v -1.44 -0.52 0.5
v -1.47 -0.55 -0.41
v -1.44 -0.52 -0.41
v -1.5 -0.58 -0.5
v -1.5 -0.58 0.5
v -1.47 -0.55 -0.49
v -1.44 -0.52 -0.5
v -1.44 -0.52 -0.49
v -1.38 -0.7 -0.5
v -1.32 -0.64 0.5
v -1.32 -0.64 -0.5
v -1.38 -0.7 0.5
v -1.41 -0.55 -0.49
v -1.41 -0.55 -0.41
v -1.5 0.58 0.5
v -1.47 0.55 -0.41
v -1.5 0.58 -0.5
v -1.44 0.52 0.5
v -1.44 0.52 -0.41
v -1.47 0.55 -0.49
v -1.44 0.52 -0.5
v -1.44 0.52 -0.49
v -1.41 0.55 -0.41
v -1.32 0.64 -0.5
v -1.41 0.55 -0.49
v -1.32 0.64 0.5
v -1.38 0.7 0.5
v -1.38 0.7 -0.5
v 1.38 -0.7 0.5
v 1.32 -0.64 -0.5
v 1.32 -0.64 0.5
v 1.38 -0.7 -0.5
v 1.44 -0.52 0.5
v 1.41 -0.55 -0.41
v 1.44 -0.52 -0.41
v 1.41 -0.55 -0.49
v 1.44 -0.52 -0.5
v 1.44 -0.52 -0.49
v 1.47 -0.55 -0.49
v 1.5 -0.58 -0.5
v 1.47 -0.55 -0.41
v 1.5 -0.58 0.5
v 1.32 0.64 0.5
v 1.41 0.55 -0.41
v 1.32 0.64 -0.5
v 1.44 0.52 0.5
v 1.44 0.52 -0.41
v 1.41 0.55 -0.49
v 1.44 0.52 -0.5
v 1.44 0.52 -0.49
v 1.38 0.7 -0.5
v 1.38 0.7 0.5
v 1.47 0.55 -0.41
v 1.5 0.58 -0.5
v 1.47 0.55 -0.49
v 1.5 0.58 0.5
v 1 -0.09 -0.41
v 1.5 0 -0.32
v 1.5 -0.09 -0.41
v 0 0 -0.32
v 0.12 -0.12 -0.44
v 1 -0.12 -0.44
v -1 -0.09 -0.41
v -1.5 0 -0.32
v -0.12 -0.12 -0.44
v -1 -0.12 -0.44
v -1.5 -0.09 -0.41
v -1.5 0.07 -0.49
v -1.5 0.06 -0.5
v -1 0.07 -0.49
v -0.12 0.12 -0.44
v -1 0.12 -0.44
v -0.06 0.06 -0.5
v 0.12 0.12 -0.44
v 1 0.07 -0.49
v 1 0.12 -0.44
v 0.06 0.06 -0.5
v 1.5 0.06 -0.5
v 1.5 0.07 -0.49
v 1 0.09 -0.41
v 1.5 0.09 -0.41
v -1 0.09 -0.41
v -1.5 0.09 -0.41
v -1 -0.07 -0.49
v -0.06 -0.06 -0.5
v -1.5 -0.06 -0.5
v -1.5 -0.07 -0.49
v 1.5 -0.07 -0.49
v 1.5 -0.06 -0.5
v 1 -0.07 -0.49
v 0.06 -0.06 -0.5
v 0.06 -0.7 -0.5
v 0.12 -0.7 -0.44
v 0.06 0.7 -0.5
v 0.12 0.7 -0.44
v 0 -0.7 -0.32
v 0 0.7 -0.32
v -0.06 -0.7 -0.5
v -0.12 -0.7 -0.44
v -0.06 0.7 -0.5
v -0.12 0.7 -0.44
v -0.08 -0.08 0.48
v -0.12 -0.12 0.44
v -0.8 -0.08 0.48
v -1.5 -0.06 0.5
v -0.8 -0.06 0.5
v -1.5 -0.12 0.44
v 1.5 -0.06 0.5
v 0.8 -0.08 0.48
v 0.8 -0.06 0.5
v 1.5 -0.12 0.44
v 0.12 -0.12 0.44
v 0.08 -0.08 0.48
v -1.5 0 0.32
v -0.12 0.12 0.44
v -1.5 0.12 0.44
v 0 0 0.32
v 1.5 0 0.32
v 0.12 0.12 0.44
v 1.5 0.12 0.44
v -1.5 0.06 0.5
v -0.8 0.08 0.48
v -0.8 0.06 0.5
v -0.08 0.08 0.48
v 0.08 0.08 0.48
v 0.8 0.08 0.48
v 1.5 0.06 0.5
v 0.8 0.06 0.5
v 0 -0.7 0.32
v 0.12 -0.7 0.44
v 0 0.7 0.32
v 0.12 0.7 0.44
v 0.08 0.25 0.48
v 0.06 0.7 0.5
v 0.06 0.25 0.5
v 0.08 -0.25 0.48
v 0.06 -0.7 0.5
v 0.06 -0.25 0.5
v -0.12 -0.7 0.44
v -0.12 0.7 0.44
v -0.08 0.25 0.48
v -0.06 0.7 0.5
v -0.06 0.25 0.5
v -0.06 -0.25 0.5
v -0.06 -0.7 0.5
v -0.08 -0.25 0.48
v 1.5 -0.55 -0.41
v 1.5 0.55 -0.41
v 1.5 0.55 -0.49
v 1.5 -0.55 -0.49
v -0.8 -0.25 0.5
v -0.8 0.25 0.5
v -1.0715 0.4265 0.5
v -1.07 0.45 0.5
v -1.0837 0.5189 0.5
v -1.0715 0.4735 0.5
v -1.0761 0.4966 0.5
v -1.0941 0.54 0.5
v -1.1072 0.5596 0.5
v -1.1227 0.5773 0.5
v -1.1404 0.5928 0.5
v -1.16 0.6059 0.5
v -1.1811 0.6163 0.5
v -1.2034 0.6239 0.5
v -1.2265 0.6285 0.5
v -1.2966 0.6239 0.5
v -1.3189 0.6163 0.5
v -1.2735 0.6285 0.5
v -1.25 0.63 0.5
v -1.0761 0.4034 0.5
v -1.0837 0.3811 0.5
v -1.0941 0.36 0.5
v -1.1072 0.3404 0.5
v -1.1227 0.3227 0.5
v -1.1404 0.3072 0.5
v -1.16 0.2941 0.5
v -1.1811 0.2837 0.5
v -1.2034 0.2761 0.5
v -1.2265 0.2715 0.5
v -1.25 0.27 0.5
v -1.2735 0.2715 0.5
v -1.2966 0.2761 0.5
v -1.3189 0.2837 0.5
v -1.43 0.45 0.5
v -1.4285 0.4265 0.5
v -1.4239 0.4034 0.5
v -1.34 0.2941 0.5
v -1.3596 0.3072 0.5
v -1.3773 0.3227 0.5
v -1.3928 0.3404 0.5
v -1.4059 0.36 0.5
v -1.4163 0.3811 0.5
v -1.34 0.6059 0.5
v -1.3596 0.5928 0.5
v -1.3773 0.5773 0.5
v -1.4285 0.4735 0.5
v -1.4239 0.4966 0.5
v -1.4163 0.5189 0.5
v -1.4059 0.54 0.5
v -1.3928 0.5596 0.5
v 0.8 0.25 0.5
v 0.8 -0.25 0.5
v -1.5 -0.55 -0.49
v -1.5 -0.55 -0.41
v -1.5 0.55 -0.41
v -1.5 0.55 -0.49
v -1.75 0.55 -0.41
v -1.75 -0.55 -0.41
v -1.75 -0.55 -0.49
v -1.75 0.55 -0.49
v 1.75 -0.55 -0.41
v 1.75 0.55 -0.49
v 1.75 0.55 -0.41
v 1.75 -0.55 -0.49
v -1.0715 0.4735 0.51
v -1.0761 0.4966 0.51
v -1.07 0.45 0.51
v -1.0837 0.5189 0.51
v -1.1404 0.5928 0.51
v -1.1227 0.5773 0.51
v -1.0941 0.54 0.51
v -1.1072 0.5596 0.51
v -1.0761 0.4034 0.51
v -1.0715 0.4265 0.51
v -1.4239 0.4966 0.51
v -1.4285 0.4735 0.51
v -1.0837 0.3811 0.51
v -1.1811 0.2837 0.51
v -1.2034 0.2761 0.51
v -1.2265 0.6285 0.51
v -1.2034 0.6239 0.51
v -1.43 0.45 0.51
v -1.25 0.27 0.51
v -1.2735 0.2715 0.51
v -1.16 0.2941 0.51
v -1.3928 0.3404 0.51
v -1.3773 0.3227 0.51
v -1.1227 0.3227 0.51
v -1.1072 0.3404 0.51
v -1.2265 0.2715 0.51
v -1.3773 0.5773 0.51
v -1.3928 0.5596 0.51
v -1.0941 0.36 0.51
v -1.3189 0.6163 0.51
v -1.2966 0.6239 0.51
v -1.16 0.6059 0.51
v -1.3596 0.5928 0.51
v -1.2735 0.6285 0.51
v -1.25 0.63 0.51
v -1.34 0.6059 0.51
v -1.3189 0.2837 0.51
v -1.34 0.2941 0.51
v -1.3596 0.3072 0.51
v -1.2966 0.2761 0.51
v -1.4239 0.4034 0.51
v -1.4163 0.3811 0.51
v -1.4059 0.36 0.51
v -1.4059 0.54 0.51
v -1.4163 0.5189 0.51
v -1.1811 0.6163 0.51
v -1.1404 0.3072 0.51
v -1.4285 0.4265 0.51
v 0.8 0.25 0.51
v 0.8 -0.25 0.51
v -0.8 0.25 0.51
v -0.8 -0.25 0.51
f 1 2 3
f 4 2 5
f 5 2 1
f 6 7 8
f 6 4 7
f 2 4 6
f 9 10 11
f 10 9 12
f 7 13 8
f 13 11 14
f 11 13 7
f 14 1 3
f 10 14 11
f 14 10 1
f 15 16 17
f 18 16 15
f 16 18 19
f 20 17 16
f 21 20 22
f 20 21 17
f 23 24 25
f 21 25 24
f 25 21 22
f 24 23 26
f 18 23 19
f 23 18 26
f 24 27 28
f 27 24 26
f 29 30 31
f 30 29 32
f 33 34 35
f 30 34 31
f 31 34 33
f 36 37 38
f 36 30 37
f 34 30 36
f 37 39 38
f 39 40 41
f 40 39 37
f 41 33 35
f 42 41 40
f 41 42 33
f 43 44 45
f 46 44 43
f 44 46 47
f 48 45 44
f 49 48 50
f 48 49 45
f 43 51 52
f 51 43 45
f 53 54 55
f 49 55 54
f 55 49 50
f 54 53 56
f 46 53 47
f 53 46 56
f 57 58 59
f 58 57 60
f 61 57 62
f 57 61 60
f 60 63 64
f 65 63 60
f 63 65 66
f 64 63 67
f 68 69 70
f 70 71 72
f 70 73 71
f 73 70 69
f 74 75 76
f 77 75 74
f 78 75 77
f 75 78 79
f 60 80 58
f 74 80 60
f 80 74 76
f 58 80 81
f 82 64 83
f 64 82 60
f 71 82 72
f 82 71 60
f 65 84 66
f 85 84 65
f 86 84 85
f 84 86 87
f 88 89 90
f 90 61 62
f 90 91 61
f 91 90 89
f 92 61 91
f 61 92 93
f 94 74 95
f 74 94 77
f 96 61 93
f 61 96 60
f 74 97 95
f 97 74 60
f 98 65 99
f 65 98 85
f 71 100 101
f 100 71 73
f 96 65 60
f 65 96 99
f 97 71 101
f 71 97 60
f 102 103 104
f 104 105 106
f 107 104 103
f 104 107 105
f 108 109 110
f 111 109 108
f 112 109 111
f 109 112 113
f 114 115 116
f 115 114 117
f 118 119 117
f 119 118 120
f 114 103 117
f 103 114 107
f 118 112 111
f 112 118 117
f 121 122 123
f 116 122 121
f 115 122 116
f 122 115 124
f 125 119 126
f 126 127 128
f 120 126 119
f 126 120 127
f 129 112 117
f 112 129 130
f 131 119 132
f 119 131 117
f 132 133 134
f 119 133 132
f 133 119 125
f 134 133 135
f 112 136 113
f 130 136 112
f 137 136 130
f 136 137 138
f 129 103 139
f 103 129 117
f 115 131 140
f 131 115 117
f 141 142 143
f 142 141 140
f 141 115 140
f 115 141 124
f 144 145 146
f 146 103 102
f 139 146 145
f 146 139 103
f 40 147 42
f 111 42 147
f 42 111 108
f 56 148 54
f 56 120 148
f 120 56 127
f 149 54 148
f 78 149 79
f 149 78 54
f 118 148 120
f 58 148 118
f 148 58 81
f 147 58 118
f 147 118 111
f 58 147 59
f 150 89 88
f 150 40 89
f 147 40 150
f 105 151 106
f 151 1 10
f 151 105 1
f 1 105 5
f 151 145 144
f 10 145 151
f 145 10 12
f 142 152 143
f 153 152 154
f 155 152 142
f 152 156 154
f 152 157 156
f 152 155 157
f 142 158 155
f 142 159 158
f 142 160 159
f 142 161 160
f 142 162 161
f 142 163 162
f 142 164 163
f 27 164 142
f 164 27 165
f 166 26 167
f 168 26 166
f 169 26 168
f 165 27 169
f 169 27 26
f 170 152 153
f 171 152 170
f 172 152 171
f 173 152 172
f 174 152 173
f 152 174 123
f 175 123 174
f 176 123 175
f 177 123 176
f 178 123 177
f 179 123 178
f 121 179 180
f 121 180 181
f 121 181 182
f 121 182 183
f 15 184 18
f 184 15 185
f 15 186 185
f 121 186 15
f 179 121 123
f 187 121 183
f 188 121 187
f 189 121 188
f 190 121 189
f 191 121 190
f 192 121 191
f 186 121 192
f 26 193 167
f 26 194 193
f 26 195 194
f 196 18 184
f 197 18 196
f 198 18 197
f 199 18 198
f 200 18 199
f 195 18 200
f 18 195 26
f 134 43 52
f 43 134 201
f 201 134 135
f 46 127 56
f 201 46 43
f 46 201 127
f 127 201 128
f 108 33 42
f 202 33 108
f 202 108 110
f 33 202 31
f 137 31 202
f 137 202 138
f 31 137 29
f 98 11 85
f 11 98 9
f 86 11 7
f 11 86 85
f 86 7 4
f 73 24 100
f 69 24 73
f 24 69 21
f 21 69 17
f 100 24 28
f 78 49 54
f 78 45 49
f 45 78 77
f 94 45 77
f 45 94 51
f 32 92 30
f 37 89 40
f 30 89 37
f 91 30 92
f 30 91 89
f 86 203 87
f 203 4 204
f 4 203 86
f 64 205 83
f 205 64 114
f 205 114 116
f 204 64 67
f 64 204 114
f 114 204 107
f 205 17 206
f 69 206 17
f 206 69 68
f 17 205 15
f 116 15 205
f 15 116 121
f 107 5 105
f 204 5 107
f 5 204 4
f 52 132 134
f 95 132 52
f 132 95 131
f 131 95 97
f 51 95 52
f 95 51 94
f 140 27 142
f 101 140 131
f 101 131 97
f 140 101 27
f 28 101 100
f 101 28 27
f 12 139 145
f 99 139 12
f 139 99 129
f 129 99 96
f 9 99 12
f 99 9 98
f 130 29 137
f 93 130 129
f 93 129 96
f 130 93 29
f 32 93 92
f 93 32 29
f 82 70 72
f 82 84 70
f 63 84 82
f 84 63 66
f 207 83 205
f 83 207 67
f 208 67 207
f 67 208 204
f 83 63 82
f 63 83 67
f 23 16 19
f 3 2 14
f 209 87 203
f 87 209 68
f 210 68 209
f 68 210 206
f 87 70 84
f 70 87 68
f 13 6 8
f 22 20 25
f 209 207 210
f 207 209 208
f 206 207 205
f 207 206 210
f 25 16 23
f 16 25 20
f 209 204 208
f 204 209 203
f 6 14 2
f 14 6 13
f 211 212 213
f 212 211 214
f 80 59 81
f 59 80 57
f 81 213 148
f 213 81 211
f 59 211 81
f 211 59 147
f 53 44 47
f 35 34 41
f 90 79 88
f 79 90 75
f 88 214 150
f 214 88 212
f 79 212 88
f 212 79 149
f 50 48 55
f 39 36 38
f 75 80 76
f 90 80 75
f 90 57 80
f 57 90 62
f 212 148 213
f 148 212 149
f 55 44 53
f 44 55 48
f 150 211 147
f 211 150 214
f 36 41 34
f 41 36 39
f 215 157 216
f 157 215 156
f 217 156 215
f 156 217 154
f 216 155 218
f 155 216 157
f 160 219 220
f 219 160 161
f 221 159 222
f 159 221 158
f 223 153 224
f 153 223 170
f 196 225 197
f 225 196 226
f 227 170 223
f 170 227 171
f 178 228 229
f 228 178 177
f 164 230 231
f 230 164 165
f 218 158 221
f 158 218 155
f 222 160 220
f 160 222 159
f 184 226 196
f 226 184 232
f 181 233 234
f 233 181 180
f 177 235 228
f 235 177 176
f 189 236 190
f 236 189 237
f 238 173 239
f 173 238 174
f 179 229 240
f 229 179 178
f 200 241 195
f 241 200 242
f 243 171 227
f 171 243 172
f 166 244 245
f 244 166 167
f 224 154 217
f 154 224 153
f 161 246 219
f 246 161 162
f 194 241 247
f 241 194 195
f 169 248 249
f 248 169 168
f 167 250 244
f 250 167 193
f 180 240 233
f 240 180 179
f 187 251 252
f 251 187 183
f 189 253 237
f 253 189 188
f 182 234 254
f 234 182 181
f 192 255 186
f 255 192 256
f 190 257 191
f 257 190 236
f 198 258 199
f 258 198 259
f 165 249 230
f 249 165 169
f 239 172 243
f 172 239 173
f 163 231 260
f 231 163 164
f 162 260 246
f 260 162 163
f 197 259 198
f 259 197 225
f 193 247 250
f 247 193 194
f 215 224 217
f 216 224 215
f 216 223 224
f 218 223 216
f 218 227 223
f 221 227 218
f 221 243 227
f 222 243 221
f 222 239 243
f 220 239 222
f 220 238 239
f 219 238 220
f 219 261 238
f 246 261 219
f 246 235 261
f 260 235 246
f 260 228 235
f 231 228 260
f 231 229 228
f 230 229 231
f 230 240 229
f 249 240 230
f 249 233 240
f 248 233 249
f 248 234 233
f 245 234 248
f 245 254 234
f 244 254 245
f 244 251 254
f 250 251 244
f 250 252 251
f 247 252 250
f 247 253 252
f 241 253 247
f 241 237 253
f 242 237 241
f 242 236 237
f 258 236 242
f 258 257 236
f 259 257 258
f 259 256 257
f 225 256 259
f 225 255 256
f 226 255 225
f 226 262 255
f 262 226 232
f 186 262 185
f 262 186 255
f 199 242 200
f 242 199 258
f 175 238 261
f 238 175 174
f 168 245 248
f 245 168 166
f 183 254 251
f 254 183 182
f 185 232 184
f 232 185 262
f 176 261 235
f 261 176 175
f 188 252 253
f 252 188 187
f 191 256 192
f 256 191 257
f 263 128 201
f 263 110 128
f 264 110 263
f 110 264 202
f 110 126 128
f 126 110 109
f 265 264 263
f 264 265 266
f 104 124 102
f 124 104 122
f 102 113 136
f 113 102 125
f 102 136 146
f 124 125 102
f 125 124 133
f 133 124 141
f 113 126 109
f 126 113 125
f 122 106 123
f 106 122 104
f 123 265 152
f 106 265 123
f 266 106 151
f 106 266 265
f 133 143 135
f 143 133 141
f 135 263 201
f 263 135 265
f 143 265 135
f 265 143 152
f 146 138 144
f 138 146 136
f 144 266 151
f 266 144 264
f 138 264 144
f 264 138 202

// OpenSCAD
// SMD package: overall body [L,W,H] = [3, 1.4, 1.0] mm
// One connected solid (pads fused to body with small overlap)

$fn = 48;

// Parameters
body_L = 3.0; //[1.5:6.0:0.1]
body_W = 1.4; //[0.7:2.8:0.1]
body_H = 1.0; //[0.5:2.0:0.1]

pad_L = 0.5; //[0.25:1.0:0.05]
pad_W = 1.1; //[0.6:1.4:0.05]
pad_T = 0.08; //[0.03:0.2:0.01]
pad_overlap = 0.25; //[0.05:0.8:0.05]  // overlap into body to guarantee connectivity

mark_R = 0.18; //[0.08:0.4:0.01]
mark_inset = 0.25; //[0.1:0.6:0.05]
mark_T = 0.05; //[0.02:0.15:0.01]

top_mark_L = 1.6; //[0.8:2.8:0.1]
top_mark_W = 0.5; //[0.2:1.2:0.05]
top_mark_T = 0.03; //[0.01:0.12:0.01]

chamfer = 0.12; //[0.00:0.35:0.01]     // small, safe chamfer
eps = 0.01; //[0.001:0.1:0.001]

// Helpers
function clamp(v, lo, hi) = v < lo ? lo : (v > hi ? hi : v);
ch = clamp(chamfer, 0, min(body_L, body_W, body_H)/3);

// Base body with simple edge chamfers (robust; avoids slanted "plane" artifacts)
module body_chamfered() {
  color([0.85, 0.85, 0.8])
  difference() {
    cube([body_L, body_W, body_H], center=true);

    // Cut 4 vertical edges (along Z) using rotated cubes
    for (sx = [-1, 1], sy = [-1, 1]) {
      translate([sx*(body_L/2 - ch/2), sy*(body_W/2 - ch/2), 0])
        rotate([0, 0, 45])
          cube([ch*sqrt(2), ch*sqrt(2), body_H + 2*eps], center=true);
    }

    // Light top/bottom edge bevels (along X) to soften silhouette
    for (sz = [-1, 1]) {
      translate([0, 0, sz*(body_H/2 - ch/2)])
        rotate([45, 0, 0])
          cube([body_L + 2*eps, ch*sqrt(2), ch*sqrt(2)], center=true);

      translate([0, 0, sz*(body_H/2 - ch/2)])
        rotate([0, 45, 0])
          cube([ch*sqrt(2), body_W + 2*eps, ch*sqrt(2)], center=true);
    }
  }
}

// Terminations (pads) fused to body
module terminal_pad(side=1) { // side = -1 (left), +1 (right)
  pad_len_total = pad_L + pad_overlap;

  // Place so inner face overlaps into body by pad_overlap
  x_center = side * (body_L/2 - pad_len_total/2 + pad_overlap);

  // Put pad on bottom, slightly intersecting body to ensure union is one solid
  z_center = -body_H/2 + pad_T/2 + eps;

  translate([x_center, 0, z_center])
    color([0.72, 0.45, 0.2])
      cube([pad_len_total, pad_W, pad_T], center=true);
}

module polarity_mark() {
  // Slightly embedded into top surface (not floating)
  translate([-body_L/2 + mark_inset, body_W/2 - mark_inset, body_H/2 - mark_T/2 + eps])
    color([0.2, 0.2, 0.2])
      cylinder(r=mark_R, h=mark_T, center=true);
}

module top_marking() {
  // Slightly embedded into top surface (not floating)
  translate([0, 0, body_H/2 - top_mark_T/2 + eps])
    color([0.2, 0.2, 0.2])
      cube([top_mark_L, top_mark_W, top_mark_T], center=true);
}

// Final output: ONE connected solid
union() {
  body_chamfered();
  terminal_pad(-1);
  terminal_pad(1);
  polarity_mark();
  top_marking();
}
